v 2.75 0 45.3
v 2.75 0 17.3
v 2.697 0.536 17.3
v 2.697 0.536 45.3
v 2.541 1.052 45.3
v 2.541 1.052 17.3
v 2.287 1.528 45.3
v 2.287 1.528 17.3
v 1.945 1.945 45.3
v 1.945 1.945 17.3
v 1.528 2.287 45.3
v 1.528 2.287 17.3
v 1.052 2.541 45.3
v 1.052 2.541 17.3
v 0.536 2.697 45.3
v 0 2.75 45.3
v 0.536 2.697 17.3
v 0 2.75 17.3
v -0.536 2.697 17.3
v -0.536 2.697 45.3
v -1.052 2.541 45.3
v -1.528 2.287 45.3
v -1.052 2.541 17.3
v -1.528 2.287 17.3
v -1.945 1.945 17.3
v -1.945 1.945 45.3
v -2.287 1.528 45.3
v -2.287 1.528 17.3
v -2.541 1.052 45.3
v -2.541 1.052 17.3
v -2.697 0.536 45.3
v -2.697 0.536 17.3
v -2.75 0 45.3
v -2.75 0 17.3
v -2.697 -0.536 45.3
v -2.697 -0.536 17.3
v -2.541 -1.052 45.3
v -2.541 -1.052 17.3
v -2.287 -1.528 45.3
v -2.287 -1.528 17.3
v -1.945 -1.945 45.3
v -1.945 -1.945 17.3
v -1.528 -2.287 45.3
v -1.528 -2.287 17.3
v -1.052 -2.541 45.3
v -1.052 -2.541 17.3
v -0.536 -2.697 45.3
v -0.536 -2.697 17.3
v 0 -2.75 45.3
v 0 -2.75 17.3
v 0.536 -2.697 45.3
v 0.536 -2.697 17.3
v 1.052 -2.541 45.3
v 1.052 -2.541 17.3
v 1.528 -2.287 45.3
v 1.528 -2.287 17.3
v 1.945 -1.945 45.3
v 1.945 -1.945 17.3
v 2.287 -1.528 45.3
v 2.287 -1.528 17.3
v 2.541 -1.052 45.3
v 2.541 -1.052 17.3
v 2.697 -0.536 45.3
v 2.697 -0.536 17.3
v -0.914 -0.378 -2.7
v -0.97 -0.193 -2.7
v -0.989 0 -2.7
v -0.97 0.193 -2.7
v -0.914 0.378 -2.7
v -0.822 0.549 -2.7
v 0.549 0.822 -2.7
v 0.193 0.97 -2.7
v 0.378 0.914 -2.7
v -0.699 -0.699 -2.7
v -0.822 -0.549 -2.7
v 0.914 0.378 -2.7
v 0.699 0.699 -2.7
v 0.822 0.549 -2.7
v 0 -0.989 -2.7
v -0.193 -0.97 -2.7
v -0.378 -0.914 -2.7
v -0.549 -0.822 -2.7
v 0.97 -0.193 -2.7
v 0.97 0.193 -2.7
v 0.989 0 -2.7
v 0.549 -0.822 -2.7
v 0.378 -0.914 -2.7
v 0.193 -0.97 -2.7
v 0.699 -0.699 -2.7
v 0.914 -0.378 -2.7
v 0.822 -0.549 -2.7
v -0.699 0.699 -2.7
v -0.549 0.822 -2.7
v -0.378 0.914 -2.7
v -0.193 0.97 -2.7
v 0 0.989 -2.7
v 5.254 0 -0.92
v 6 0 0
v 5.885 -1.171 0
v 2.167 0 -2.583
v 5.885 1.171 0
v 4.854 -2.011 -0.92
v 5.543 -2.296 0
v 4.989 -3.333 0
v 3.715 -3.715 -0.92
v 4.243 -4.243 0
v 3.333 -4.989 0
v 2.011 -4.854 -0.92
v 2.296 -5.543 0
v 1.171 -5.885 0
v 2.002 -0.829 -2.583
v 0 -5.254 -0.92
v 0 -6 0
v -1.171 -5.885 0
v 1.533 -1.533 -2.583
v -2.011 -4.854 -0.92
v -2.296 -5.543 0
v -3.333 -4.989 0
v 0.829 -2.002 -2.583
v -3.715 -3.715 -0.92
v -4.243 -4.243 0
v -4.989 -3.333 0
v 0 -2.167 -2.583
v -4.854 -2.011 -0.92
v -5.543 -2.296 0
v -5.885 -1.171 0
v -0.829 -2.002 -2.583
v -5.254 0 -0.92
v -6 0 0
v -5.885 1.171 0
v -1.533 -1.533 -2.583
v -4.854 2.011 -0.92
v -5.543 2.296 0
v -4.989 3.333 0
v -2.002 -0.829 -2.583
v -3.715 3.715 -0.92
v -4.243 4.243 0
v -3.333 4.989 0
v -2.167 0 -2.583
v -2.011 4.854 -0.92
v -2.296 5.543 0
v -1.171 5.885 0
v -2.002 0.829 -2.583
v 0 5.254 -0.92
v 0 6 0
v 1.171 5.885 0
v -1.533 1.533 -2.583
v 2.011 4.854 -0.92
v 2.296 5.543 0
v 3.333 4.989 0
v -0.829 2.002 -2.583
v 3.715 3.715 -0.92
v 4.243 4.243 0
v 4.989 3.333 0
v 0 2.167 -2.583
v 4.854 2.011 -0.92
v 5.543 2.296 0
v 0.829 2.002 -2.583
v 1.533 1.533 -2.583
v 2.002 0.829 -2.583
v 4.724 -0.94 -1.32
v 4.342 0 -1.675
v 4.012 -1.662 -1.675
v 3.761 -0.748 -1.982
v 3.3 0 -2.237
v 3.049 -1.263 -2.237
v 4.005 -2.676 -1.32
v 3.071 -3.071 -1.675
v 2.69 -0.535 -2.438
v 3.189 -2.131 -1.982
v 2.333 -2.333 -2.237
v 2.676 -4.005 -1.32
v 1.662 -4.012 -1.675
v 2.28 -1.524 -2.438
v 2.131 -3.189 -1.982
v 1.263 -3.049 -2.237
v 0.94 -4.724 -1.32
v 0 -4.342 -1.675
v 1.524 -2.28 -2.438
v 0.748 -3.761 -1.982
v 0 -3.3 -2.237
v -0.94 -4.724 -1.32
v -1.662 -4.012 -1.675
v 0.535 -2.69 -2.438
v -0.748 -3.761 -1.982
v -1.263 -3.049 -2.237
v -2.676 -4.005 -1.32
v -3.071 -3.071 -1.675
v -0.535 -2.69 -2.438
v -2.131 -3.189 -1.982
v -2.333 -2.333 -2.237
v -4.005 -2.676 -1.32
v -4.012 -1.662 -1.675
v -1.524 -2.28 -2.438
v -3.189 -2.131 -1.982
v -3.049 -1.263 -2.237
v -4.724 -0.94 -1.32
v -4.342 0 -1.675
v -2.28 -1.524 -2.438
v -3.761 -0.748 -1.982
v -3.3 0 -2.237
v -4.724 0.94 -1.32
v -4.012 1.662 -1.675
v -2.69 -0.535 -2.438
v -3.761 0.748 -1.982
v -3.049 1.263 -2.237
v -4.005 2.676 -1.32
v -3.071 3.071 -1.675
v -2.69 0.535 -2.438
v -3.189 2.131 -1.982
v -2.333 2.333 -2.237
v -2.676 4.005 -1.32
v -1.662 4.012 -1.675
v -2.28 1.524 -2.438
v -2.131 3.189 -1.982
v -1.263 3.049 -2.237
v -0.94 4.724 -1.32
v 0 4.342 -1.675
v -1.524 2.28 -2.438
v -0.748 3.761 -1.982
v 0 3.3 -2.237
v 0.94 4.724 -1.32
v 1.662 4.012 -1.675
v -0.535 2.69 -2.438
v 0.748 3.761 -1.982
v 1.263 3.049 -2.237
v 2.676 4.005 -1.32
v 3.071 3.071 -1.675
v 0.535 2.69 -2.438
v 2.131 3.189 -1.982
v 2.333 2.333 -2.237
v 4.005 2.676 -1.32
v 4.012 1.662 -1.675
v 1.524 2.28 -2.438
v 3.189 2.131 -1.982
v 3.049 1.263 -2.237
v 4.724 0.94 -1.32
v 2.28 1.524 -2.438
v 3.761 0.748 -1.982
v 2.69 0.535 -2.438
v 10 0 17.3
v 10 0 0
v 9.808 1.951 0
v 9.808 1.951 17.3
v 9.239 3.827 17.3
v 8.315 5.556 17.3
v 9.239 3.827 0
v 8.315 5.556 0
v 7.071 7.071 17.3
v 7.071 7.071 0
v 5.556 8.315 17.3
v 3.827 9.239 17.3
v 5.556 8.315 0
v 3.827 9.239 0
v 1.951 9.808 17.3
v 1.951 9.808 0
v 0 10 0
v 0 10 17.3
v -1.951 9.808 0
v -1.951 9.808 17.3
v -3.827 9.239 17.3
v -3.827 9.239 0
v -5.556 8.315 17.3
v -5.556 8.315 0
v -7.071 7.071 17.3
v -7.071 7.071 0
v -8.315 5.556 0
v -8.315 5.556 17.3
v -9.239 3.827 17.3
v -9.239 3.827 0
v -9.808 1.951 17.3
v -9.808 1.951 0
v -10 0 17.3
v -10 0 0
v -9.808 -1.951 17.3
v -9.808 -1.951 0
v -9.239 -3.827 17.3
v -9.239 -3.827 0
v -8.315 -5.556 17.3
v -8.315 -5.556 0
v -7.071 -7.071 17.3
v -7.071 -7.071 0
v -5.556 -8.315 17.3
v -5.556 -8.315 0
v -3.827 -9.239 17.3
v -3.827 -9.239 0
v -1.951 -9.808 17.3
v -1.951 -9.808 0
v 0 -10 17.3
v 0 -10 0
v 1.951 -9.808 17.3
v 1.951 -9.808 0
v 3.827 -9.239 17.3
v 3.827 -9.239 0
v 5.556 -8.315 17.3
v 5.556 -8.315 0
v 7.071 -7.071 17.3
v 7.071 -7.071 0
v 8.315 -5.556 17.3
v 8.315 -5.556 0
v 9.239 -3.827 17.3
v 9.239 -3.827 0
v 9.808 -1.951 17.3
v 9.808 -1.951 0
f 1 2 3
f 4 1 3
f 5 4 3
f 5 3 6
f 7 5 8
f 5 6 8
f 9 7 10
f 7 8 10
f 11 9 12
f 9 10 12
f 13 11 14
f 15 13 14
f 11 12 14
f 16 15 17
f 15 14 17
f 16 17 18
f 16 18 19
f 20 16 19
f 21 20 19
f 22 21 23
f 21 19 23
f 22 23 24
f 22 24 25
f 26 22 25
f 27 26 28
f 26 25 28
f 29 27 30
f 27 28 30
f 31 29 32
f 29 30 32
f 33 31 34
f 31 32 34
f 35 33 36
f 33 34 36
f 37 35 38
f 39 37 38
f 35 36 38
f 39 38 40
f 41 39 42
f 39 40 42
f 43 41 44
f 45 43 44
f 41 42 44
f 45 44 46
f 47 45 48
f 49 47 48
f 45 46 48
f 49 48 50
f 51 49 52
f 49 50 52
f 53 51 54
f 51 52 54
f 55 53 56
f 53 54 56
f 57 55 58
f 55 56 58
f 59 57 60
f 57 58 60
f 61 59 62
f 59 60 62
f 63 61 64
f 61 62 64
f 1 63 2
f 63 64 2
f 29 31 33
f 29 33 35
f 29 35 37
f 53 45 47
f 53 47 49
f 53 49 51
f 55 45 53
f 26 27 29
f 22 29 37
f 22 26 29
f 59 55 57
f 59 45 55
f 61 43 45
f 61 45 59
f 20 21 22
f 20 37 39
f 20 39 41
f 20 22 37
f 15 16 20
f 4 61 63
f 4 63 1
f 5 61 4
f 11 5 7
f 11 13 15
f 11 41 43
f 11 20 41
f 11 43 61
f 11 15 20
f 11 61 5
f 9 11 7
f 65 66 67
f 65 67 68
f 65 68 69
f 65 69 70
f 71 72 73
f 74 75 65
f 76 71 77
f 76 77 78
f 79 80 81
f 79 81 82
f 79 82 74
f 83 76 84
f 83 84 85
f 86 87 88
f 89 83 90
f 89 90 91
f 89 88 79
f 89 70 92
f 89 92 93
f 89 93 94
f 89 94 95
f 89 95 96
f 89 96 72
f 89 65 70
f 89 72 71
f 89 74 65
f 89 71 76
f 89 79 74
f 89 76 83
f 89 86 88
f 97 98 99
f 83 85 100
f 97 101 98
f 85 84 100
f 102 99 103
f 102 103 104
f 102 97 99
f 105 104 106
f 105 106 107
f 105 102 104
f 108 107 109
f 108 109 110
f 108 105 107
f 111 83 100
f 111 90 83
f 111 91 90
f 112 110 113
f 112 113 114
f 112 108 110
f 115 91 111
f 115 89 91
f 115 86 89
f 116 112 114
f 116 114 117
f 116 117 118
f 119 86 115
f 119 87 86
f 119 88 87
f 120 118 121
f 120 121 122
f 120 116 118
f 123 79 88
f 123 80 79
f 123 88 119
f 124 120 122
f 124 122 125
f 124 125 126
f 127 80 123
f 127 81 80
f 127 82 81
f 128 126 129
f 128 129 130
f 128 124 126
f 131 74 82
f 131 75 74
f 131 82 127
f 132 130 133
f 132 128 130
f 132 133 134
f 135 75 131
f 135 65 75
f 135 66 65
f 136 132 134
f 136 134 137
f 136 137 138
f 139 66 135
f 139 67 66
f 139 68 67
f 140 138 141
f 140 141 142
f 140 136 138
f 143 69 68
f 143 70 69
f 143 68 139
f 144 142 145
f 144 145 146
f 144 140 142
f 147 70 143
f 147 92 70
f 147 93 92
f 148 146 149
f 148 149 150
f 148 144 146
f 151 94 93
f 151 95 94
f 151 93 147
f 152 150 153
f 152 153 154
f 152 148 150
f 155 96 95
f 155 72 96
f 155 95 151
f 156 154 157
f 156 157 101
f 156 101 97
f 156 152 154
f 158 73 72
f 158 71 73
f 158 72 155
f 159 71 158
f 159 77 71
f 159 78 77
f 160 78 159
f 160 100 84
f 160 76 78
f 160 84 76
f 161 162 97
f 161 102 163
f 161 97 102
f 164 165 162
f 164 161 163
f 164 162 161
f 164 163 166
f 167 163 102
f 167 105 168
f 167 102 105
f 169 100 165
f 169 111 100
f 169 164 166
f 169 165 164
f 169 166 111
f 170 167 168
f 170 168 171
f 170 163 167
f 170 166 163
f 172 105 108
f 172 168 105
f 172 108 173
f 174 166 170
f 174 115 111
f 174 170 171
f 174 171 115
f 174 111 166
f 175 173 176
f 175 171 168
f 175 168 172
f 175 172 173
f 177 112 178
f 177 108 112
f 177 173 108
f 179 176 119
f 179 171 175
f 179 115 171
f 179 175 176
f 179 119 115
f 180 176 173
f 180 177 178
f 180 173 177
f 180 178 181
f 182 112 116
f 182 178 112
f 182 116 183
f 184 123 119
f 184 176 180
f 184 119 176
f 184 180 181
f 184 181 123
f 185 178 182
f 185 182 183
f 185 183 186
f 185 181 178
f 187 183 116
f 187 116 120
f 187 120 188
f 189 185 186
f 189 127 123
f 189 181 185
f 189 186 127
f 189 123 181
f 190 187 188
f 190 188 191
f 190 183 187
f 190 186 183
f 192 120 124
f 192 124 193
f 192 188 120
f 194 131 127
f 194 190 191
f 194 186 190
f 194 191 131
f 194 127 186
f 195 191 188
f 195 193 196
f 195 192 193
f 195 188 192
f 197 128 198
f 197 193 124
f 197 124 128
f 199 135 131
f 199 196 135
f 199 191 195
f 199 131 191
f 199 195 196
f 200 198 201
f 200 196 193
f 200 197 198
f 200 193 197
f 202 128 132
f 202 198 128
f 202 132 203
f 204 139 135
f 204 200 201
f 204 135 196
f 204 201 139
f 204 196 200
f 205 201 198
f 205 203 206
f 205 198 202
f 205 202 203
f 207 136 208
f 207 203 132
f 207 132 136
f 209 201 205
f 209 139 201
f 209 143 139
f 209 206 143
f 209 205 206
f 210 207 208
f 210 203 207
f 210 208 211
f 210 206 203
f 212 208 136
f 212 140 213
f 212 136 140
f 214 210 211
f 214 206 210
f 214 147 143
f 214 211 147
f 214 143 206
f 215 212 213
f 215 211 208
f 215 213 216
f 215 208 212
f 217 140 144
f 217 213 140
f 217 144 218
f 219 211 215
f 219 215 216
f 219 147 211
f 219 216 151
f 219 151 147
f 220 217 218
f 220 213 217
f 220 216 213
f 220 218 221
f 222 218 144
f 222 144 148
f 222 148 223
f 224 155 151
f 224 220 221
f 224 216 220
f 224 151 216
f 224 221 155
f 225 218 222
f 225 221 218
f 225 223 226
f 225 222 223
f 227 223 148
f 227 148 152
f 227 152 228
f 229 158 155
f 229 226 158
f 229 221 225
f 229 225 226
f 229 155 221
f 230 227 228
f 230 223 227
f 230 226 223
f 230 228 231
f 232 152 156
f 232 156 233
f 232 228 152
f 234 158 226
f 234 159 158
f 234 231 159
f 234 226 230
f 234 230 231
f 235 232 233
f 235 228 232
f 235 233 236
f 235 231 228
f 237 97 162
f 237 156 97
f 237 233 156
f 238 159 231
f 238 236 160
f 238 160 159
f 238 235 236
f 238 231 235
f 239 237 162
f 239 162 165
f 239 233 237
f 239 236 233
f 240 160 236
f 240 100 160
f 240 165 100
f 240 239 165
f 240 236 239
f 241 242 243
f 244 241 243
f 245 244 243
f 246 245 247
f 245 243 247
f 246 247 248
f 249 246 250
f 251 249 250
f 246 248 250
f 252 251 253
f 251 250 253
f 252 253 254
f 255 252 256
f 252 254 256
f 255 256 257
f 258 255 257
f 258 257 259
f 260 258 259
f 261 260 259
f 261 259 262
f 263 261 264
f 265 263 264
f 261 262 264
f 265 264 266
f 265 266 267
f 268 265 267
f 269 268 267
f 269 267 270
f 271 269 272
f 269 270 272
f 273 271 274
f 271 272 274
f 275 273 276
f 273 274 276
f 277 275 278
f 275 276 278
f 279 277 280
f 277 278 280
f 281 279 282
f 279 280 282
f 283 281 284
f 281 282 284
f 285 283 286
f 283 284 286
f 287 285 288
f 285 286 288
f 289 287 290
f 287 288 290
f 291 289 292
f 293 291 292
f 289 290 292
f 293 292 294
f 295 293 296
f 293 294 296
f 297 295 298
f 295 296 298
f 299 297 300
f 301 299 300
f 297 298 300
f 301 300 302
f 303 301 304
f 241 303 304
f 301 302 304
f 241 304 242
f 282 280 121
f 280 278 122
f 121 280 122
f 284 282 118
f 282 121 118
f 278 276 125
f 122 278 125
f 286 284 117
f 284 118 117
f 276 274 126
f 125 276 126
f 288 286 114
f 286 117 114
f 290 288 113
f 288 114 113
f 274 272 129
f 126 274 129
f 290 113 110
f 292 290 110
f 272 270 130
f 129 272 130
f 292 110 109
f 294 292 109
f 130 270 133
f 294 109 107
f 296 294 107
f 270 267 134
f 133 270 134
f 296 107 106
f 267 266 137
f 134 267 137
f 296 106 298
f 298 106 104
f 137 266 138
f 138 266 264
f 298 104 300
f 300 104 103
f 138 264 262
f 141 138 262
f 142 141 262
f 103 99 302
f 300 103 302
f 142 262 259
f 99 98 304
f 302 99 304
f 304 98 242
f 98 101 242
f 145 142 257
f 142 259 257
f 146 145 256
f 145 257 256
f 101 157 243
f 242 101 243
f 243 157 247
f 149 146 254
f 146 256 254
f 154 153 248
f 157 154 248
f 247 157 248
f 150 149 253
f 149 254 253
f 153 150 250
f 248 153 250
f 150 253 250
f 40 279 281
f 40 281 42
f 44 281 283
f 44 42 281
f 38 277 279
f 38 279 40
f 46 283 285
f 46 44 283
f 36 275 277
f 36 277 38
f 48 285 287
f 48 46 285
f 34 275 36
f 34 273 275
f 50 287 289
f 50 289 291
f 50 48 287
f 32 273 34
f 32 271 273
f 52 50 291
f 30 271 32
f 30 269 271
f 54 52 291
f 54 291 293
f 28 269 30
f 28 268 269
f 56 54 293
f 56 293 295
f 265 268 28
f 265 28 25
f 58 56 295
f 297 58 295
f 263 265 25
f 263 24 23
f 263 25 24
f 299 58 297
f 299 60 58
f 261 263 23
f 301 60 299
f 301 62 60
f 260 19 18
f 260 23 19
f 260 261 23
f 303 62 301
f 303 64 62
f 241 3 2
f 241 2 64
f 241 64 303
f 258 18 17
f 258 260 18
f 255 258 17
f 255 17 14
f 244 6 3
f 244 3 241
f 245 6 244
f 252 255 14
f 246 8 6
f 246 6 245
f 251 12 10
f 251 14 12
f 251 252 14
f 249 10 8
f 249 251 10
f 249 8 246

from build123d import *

# Parameters (mm, degrees)
ESQUISSE1_R        = 10
BOSS_EXTRU_1_DEPTH = 17.3
ESQUISSE2_R        = 2.75
BOSS_EXTRU_2_DEPTH = 28
ESQUISSE3_R        = 6
BOSS_EXTRU_3_DEPTH = 2.7
CONG_2_R           = 6


with BuildPart() as part:
    # Esquisse1 → Boss.-Extru.1 (new body)
    with BuildSketch(Plane.XY):
        Circle(ESQUISSE1_R)
    extrude(amount=BOSS_EXTRU_1_DEPTH)

    # Esquisse2 → Boss.-Extru.2 (add)
    with BuildSketch(Plane.XY.offset(17.3)):
        Circle(ESQUISSE2_R)
    extrude(amount=BOSS_EXTRU_2_DEPTH)

    # Esquisse3 → Boss.-Extru.3 (add)
    with BuildSketch(Plane(origin=(0, 0, 0), x_dir=(-1, 0, 0), z_dir=(0, 0, -1))):
        with Locations(Location((0, 0, 0), (0, 0, 180))):
            Circle(ESQUISSE3_R)
    extrude(amount=BOSS_EXTRU_3_DEPTH)

    # Congé2
    # the kernel refuses this fillet: 6 mm, written as the material it takes off along each edge
    with BuildSketch(Plane(origin=(0, 0, -2.7), x_dir=(1, 0, 0), z_dir=(0, 1, 0))) as cong_2_piece_1:
        with BuildLine():
            CenterArc((0.989012073, -6), CONG_2_R, 33.367012969, 56.632987031)
            Line((0.989012073, 0), (0.989012073, 0.12))
            Line((0.989012073, 0.12), (6, 0.12))
            Line((6, 0.12), (6.12, 0))
            ThreePointArc((6.12, 0), (6.12, -1.35), (6.100219759, -2.634))
            Line((6.100219759, -2.634), (6, -2.7))
        make_face()
    revolve(axis=Axis((0, 0, -2.7), (0, 0, -1)), mode=Mode.SUBTRACT)


solid = part.part
